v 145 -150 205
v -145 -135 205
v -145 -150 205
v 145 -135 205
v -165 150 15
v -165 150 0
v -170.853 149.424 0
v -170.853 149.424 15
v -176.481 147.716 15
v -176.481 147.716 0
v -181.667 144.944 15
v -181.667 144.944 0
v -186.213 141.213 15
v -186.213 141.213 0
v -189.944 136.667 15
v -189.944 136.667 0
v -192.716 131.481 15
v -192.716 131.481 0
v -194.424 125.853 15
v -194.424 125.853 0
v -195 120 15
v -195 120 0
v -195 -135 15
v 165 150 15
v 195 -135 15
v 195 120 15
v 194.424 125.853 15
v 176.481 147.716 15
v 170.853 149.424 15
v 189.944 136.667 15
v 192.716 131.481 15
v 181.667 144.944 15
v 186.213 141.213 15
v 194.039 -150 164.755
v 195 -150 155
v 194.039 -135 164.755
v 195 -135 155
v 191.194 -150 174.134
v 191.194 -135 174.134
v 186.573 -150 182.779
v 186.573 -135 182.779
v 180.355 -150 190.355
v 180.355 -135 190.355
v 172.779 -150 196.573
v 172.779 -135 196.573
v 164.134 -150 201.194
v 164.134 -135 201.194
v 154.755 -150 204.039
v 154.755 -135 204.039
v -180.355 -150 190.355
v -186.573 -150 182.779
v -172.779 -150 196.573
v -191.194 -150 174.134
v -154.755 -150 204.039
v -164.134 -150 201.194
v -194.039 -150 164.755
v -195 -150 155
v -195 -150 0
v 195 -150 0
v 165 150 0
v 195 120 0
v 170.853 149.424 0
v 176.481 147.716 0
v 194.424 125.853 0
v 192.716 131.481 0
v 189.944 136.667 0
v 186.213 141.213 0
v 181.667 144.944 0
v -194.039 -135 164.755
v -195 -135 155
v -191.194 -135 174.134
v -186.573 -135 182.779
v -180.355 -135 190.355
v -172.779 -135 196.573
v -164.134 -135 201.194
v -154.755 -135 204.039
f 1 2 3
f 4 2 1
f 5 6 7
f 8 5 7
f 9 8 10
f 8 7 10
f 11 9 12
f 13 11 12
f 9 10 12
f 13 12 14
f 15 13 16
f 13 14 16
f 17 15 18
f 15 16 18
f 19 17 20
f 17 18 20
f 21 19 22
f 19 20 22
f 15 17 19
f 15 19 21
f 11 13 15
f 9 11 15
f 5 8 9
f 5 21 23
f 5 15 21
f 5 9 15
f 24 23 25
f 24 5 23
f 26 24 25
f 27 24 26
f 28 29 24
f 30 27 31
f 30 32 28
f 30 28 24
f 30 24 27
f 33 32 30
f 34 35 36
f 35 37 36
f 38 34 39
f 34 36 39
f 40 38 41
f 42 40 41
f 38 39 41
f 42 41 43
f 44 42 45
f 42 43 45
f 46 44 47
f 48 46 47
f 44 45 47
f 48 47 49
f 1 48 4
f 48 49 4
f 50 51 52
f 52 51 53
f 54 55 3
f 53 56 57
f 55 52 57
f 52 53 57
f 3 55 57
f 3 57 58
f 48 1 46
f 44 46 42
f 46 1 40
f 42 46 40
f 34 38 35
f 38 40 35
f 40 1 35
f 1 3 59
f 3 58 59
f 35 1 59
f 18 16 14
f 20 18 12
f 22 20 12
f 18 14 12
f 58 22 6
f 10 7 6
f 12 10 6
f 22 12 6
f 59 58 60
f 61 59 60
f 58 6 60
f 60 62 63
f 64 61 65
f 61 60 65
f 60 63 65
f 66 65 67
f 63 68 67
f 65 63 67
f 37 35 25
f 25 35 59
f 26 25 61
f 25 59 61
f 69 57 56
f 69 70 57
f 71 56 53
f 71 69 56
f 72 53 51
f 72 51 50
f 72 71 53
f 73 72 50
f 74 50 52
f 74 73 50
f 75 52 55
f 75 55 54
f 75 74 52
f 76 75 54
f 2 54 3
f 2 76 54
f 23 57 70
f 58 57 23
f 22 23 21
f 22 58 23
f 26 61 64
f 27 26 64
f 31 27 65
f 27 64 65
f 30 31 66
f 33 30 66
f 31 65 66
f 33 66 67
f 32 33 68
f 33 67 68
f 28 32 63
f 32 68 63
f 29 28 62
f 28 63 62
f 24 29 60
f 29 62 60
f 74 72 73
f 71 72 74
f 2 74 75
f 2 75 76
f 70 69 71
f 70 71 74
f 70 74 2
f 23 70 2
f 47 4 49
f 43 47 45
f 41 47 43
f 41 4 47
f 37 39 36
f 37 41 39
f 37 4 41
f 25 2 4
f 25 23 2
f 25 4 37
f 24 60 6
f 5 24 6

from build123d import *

# Parameters (mm, degrees)
F1_DEPTH = 15
F2_W     = 390
F2_H     = 15
F3_DEPTH = 190
F4_R     = 50


with BuildPart() as f1:
    # F0 (on Top) → F1 (new body)
    with BuildSketch(Plane.XY):
        with BuildLine():
            Line((-195, 120), (-195, -150))
            Line((-195, -150), (195, -150))
            Line((195, -150), (195, 120))
            ThreePointArc((195, 120), (186.213203, 141.213203), (165, 150))
            Line((165, 150), (-165, 150))
            ThreePointArc((-165, 150), (-186.213203, 141.213203), (-195, 120))
        make_face()
    extrude(amount=F1_DEPTH)

    # F2 (on face) → F3 (join)
    with BuildSketch(Plane.XY.offset(15)):
        with Locations((0, -142.5)):
            Rectangle(F2_W, F2_H)
    extrude(amount=F3_DEPTH)

    # F4
    f4_edges = [f1.edges().sort_by_distance(p)[0] for p in [
        (195, -142.5, 205),
        (-195, -142.5, 205),
    ]]
    fillet(f4_edges, radius=F4_R)


solid = f1.part
